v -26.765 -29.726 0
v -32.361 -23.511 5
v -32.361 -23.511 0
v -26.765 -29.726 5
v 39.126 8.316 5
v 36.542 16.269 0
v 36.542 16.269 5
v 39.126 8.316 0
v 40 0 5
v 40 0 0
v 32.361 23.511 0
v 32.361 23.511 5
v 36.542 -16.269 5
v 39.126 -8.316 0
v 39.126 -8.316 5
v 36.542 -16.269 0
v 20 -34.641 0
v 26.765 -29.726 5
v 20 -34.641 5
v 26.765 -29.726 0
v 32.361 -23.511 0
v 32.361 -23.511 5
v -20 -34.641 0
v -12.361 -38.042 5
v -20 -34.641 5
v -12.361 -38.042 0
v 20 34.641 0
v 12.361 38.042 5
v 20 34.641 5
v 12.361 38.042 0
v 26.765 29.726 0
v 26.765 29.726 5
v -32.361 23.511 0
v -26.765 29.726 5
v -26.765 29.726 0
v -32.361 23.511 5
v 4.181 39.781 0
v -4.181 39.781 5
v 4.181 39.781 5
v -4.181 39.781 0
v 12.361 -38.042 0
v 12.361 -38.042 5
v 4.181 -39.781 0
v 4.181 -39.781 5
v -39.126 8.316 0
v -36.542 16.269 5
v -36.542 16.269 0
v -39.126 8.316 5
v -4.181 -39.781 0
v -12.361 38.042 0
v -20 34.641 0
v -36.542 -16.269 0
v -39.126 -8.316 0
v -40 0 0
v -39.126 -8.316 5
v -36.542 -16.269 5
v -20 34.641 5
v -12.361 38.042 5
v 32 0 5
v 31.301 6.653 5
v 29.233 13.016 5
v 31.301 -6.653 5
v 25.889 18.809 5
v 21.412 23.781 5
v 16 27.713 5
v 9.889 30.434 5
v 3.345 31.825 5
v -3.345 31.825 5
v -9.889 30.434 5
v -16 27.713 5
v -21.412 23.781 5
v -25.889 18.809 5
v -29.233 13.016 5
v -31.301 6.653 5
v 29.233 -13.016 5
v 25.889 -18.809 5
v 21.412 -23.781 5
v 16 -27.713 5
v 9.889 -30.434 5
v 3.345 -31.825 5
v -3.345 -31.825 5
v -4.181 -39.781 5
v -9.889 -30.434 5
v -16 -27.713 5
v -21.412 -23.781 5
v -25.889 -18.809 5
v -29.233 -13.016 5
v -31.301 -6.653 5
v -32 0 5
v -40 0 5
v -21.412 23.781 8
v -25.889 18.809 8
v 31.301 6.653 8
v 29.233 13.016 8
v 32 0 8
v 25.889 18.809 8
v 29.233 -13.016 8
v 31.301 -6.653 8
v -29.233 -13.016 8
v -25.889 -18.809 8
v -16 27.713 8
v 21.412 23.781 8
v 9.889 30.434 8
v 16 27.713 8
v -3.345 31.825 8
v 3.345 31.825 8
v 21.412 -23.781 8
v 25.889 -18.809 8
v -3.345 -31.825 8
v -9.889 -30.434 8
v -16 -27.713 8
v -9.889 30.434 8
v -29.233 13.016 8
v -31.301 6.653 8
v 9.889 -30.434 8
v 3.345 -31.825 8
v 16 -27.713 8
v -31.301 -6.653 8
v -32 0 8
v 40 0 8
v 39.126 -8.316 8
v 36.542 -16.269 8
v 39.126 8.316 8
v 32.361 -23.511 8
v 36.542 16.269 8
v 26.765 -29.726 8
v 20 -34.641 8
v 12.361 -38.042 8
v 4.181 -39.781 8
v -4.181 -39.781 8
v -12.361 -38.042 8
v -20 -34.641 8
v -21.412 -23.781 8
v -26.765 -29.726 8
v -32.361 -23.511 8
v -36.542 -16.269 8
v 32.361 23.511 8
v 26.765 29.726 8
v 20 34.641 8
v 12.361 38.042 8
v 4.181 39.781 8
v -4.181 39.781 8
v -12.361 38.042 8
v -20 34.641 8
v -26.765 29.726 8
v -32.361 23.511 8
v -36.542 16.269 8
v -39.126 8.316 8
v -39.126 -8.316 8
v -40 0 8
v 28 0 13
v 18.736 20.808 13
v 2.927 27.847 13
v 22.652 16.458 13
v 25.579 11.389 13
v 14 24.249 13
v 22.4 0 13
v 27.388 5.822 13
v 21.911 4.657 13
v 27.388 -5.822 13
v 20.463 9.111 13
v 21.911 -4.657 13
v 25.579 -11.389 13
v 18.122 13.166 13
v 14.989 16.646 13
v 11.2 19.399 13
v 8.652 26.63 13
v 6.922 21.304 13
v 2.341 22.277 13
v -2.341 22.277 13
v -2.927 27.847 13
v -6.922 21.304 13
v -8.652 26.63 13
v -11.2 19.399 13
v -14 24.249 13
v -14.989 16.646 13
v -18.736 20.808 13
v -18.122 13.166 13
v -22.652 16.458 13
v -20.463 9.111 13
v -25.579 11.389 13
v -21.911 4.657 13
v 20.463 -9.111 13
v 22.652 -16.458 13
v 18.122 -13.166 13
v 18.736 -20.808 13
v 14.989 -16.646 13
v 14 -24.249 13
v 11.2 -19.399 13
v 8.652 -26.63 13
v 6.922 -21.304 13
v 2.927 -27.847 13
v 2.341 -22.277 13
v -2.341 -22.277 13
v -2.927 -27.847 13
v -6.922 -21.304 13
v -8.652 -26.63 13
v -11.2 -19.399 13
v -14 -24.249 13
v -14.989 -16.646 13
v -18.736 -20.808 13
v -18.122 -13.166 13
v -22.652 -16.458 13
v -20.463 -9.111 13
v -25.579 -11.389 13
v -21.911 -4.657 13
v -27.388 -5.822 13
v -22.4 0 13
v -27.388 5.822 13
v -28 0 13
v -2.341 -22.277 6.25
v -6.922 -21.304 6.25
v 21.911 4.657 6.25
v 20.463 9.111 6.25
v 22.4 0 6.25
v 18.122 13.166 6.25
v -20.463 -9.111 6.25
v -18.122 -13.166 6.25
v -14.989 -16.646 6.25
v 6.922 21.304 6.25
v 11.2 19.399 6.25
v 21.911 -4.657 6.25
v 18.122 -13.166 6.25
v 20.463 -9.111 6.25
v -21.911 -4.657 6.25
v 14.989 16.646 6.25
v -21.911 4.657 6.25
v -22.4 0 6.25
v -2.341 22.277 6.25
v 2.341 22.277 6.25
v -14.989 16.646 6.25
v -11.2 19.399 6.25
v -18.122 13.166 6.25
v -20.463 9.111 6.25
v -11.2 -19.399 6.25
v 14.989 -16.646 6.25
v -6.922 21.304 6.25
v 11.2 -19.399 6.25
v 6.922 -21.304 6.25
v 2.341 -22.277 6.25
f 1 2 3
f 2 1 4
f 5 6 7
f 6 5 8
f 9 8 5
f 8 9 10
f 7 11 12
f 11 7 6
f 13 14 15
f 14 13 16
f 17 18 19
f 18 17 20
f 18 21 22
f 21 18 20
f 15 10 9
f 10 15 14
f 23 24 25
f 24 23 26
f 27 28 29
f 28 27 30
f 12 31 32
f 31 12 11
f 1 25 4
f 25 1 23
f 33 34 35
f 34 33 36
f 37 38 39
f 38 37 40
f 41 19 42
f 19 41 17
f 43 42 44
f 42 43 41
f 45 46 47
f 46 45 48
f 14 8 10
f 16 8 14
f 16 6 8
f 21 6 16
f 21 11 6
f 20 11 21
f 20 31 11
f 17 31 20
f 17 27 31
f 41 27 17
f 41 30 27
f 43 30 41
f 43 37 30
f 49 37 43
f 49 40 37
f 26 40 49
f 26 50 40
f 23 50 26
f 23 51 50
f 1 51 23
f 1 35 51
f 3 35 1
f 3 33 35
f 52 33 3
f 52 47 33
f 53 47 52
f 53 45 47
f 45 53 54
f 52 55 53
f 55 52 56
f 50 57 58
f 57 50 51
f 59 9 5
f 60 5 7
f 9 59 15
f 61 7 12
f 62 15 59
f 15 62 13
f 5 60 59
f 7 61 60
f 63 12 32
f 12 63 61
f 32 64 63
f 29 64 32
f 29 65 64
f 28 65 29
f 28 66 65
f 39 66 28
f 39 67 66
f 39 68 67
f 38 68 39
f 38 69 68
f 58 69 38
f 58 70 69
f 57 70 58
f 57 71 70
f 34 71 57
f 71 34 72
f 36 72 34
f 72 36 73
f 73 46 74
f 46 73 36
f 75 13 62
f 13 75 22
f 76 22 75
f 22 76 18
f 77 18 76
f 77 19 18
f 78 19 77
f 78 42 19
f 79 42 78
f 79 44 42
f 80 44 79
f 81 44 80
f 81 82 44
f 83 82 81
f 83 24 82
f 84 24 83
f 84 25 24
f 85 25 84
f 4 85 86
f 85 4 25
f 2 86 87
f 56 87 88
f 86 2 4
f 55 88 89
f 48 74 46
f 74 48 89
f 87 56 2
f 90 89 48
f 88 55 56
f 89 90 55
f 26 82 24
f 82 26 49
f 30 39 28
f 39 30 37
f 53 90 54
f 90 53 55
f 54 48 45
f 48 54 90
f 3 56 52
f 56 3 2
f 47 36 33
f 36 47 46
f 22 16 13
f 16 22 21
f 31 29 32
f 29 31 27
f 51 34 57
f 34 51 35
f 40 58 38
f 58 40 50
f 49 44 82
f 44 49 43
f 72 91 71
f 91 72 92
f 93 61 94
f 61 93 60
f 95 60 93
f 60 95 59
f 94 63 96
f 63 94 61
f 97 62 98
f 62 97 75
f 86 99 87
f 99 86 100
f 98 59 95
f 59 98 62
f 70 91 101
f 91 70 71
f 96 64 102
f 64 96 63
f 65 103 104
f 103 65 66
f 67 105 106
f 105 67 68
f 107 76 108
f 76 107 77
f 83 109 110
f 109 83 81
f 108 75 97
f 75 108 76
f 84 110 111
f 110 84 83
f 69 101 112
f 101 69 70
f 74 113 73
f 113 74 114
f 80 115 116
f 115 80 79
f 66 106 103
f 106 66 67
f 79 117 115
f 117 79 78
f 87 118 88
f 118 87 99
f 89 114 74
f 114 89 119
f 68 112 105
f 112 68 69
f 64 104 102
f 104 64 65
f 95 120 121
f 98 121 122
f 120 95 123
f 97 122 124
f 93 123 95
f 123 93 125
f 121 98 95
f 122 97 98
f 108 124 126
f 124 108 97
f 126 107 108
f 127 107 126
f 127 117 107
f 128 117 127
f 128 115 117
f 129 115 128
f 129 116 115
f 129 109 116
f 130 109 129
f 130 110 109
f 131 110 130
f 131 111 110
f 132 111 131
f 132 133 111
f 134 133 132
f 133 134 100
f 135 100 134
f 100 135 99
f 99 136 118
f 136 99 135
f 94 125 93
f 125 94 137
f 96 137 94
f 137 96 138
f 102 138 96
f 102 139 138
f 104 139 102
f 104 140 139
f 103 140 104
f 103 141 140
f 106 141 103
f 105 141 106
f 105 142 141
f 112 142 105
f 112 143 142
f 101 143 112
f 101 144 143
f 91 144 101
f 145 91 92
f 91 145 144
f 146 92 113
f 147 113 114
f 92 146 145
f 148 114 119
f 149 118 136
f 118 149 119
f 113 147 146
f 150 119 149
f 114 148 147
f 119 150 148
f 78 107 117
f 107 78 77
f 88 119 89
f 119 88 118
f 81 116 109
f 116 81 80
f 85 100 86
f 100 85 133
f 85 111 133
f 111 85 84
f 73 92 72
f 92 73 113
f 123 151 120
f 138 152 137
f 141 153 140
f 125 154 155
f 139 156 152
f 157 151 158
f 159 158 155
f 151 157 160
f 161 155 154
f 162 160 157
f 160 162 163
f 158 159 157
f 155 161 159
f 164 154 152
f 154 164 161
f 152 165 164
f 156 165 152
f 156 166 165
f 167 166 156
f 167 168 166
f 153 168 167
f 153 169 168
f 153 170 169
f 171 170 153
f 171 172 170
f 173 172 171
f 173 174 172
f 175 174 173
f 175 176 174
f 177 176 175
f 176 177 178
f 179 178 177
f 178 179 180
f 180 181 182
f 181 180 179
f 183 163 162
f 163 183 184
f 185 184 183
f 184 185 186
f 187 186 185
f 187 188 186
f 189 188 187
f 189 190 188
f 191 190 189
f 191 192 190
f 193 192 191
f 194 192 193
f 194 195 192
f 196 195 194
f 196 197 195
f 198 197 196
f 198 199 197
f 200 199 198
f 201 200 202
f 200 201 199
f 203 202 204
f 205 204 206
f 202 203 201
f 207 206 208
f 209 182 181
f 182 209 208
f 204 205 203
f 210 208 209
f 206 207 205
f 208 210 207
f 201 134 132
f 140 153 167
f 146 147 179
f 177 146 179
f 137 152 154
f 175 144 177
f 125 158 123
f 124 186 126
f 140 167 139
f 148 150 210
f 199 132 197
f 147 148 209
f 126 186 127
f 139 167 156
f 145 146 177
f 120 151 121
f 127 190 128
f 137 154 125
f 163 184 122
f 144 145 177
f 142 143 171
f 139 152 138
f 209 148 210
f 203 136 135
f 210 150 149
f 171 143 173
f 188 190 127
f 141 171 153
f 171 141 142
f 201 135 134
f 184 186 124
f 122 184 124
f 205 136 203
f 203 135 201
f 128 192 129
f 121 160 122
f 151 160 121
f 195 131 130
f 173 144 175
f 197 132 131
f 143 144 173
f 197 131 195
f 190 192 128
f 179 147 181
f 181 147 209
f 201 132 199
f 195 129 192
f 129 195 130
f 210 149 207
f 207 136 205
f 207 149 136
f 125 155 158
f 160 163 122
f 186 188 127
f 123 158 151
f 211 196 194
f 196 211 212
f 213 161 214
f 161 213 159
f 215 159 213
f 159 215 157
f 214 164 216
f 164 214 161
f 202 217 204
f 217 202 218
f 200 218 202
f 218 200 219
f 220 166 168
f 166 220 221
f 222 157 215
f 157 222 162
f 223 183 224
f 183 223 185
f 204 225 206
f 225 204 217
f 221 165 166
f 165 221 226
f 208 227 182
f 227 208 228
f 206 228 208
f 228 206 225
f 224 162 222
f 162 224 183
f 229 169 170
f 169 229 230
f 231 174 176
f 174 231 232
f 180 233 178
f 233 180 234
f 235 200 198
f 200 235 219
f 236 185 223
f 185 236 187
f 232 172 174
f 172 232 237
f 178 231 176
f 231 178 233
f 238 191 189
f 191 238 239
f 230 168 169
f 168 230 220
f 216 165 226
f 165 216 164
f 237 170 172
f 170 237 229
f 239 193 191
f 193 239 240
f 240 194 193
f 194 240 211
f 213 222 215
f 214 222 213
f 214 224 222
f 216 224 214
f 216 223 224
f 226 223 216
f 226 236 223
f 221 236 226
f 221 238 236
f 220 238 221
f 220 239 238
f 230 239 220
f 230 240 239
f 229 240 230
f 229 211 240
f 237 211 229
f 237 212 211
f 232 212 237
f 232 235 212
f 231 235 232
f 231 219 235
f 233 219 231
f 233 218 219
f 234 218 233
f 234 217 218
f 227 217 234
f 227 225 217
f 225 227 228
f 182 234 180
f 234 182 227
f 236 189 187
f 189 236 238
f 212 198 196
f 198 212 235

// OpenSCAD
//CUSTOMIZER VARIABLES

top_height=5; // [0:30]
groove_height=3; // [0:30]
top_width=40; // [0:100]
mid_width=32; // [0:100]

//CUSTOMIZER VARIABLES END

grommet_cap(top_height,mid_width,top_width,groove_height);

module top(h=5,r=10) {
  cylinder(h,r,r);
}

module bottom(h=5,r=10) {
  cylinder(h,r,.7*r);
}

module mid(h=3,r=7) {
  cylinder(h,r,r);
}

module solid(h=5,r1=10,r2=15,g=3) {
  union() {
    top(h,r2);
    translate([0,0,h]) mid(g,r1);
    translate([0,0,h+g]) bottom(h,r2);
  }
}

module grommet_cap(h,r1,r2,g) {
  difference() {
    solid(h,r1,r2,g);
    translate([0,0,1.25*h]) cylinder(2*(h+g),.7*r1,.7*r1);
  }
}
